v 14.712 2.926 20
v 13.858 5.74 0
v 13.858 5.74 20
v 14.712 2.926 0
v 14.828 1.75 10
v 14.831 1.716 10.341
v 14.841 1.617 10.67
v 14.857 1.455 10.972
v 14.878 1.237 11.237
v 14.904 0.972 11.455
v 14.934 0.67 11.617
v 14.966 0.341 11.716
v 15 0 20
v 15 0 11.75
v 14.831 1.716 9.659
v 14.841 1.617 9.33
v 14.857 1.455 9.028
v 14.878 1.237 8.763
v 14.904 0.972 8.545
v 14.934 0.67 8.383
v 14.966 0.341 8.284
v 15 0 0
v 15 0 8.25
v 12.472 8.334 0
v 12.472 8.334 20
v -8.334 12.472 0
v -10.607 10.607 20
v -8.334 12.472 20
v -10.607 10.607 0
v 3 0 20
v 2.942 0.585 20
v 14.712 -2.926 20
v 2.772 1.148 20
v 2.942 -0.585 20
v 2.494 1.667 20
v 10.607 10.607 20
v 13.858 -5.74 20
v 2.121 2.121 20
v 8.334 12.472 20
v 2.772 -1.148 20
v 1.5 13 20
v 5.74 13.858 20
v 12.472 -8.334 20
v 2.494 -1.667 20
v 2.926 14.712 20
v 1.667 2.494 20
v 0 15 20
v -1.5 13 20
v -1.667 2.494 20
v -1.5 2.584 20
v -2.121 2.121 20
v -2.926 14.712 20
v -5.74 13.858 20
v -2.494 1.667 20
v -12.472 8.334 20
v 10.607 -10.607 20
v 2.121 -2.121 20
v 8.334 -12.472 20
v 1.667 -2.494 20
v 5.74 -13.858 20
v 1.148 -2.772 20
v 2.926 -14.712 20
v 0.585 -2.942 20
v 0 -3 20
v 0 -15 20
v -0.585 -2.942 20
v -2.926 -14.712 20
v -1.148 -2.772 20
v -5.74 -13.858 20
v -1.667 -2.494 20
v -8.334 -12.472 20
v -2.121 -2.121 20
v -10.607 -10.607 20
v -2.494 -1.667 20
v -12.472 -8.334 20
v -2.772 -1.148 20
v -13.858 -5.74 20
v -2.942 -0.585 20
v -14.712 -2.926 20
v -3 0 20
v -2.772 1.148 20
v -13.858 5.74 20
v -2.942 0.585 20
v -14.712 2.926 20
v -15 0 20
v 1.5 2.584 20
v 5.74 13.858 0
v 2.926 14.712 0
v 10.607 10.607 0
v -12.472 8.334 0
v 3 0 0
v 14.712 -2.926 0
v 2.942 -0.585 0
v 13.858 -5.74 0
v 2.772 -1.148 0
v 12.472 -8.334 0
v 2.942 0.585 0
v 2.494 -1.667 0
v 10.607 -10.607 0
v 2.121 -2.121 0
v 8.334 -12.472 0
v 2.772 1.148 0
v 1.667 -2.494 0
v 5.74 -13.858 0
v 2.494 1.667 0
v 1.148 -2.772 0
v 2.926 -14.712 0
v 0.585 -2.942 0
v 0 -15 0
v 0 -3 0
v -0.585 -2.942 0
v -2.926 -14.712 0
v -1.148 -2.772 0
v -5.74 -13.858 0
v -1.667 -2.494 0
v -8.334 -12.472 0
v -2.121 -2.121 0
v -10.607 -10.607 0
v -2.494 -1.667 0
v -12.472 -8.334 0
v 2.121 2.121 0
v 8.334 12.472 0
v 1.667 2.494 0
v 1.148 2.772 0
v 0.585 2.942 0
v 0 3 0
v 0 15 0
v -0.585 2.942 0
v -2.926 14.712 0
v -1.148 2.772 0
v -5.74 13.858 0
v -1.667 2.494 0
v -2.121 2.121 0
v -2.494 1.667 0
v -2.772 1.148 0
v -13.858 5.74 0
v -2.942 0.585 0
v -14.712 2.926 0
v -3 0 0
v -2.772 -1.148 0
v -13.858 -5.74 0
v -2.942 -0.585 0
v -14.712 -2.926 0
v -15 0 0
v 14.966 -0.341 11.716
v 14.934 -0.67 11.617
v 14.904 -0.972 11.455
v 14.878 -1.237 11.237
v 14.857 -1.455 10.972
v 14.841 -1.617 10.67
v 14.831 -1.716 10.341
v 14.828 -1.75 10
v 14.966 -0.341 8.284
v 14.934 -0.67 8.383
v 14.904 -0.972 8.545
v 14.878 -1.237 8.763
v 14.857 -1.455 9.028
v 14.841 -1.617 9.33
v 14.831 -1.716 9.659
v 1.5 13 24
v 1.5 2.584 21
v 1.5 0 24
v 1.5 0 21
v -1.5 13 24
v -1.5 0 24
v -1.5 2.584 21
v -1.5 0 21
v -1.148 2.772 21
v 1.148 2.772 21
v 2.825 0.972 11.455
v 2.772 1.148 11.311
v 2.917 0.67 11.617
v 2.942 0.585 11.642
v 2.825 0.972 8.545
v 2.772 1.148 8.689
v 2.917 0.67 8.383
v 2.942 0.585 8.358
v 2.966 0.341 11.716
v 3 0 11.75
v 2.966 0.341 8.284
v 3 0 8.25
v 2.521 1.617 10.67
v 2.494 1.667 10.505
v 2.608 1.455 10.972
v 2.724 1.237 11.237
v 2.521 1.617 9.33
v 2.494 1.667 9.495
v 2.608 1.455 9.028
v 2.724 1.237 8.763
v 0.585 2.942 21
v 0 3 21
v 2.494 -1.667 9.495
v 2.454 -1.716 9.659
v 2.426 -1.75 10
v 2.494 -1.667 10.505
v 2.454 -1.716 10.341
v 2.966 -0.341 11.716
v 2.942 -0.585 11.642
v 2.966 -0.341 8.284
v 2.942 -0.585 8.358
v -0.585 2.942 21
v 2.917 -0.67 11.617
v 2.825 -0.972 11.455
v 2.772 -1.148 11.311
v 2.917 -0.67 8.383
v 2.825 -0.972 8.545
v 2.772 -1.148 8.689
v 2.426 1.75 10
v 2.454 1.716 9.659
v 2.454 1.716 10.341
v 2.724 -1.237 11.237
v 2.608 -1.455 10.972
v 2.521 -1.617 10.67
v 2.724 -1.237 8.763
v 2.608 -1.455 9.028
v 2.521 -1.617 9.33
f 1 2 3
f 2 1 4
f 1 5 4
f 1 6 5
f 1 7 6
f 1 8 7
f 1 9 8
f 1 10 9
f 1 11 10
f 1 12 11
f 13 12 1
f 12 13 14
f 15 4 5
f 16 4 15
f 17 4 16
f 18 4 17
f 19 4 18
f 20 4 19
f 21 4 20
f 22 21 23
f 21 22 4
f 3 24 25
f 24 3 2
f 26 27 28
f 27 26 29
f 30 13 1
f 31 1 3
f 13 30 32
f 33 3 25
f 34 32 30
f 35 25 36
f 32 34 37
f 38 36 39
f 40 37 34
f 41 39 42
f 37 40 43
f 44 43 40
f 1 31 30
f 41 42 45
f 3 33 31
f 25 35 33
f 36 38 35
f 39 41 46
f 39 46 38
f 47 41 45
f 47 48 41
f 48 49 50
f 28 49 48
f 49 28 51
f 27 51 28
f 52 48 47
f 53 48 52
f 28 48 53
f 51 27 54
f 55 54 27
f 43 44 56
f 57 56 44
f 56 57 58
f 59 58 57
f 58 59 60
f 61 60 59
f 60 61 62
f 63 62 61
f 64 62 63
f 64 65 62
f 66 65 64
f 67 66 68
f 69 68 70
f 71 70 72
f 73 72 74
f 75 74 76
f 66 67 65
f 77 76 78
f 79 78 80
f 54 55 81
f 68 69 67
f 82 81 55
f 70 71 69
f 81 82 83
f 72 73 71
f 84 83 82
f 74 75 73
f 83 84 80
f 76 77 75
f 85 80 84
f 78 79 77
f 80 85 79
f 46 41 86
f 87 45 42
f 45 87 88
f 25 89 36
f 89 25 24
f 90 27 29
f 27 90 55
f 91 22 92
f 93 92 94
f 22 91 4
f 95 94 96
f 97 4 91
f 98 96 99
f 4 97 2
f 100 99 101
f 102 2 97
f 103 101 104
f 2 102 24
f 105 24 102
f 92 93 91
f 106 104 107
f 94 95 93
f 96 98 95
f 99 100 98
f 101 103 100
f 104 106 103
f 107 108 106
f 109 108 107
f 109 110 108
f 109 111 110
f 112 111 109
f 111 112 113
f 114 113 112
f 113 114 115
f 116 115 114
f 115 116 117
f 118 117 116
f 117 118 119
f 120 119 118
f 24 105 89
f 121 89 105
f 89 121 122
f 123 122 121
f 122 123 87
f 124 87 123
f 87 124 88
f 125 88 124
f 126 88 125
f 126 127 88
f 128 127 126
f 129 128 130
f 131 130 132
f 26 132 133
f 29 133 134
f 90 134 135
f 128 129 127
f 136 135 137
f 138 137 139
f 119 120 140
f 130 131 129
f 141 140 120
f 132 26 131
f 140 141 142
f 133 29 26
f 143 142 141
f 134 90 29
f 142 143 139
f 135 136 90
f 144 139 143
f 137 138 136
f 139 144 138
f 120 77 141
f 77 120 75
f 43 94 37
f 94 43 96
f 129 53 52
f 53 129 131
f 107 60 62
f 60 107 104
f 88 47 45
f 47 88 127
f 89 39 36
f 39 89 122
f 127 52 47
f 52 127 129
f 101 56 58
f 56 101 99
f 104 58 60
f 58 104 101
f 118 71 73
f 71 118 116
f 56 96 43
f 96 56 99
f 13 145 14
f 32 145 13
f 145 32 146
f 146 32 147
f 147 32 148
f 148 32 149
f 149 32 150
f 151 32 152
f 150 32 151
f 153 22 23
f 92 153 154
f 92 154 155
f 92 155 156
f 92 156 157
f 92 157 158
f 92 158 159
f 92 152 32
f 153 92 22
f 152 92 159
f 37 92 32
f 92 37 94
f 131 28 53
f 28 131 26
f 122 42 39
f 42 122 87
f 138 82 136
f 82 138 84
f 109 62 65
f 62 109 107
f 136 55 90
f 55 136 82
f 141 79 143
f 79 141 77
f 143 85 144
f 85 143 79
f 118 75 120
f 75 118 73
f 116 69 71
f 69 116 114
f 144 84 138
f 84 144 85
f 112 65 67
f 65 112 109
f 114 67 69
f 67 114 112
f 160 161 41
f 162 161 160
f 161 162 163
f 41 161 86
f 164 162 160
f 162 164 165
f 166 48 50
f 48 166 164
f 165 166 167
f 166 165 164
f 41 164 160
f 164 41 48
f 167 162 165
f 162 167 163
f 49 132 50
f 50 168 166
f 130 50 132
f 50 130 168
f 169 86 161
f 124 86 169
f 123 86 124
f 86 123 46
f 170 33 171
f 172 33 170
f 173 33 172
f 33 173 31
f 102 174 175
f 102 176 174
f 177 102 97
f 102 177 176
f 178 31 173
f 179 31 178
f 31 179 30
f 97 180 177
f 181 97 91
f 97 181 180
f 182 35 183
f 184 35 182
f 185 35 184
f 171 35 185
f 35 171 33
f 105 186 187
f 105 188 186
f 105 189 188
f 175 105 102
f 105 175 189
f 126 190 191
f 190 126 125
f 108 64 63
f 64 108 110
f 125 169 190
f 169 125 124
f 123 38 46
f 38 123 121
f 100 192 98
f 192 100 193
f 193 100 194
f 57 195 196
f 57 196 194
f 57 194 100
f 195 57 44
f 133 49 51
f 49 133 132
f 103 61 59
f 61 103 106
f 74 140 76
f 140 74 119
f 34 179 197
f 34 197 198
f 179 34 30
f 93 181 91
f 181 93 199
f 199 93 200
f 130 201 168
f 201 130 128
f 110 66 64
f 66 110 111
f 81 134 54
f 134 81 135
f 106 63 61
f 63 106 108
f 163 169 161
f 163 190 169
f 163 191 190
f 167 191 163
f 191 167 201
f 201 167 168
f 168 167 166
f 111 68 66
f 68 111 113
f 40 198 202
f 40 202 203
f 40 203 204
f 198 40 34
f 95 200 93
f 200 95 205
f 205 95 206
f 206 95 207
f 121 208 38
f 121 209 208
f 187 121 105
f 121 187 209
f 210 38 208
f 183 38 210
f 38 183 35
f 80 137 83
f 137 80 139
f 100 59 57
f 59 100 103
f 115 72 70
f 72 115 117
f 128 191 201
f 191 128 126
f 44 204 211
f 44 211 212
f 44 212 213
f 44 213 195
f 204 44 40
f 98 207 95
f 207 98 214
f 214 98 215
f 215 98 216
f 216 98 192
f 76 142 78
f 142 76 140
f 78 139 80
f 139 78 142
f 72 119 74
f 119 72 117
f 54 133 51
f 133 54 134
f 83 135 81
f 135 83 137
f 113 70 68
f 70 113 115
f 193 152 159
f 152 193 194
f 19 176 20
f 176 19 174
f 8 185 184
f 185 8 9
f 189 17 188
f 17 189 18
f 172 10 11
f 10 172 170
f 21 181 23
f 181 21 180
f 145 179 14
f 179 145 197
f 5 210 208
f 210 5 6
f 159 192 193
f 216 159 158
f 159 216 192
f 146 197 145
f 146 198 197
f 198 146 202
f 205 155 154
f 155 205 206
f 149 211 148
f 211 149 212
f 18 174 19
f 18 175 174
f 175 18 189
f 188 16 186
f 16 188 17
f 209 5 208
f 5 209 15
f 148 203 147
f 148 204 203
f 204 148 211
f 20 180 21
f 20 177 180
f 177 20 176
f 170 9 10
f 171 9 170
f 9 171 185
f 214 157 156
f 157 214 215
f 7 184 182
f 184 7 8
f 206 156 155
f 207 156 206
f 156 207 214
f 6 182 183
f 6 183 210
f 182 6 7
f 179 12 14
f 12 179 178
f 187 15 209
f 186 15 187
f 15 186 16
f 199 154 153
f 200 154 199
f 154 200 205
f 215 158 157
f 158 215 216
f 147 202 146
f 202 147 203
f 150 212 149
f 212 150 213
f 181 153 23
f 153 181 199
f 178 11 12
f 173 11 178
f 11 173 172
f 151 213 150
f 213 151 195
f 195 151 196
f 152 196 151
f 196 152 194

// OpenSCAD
$fn = 32;

// ----------------------------------------------------------------------
// Control knob: pointer knob
// ----------------------------------------------------------------------

// --- parameters (mm) ---
rib_w = 3;                // pointer rib width
rib_h = 5;                // pointer rib height
knob_d = 30;              // knob body diameter
knob_h = 20;              // knob body height
bore_d = 6;               // shaft bore diameter
set_d = 3.5;              // set screw bore diameter

rib_poke = rib_h - 1;  // rib height above the top
total_h = knob_h + rib_h - 1;  // overall height

difference() {
  union() {
    cylinder(h = knob_h, d = knob_d);
    translate([-rib_w / 2, 0, knob_h - 1])
      cube([rib_w, knob_d / 2 - 2, rib_h]);
  }
  translate([0, 0, -1]) cylinder(h = knob_h + 2, d = bore_d);
  translate([-1, 0, knob_h / 2]) rotate([0, 90, 0])
    cylinder(h = knob_d / 2 + bore_d / 2 + 2, d = set_d);}
